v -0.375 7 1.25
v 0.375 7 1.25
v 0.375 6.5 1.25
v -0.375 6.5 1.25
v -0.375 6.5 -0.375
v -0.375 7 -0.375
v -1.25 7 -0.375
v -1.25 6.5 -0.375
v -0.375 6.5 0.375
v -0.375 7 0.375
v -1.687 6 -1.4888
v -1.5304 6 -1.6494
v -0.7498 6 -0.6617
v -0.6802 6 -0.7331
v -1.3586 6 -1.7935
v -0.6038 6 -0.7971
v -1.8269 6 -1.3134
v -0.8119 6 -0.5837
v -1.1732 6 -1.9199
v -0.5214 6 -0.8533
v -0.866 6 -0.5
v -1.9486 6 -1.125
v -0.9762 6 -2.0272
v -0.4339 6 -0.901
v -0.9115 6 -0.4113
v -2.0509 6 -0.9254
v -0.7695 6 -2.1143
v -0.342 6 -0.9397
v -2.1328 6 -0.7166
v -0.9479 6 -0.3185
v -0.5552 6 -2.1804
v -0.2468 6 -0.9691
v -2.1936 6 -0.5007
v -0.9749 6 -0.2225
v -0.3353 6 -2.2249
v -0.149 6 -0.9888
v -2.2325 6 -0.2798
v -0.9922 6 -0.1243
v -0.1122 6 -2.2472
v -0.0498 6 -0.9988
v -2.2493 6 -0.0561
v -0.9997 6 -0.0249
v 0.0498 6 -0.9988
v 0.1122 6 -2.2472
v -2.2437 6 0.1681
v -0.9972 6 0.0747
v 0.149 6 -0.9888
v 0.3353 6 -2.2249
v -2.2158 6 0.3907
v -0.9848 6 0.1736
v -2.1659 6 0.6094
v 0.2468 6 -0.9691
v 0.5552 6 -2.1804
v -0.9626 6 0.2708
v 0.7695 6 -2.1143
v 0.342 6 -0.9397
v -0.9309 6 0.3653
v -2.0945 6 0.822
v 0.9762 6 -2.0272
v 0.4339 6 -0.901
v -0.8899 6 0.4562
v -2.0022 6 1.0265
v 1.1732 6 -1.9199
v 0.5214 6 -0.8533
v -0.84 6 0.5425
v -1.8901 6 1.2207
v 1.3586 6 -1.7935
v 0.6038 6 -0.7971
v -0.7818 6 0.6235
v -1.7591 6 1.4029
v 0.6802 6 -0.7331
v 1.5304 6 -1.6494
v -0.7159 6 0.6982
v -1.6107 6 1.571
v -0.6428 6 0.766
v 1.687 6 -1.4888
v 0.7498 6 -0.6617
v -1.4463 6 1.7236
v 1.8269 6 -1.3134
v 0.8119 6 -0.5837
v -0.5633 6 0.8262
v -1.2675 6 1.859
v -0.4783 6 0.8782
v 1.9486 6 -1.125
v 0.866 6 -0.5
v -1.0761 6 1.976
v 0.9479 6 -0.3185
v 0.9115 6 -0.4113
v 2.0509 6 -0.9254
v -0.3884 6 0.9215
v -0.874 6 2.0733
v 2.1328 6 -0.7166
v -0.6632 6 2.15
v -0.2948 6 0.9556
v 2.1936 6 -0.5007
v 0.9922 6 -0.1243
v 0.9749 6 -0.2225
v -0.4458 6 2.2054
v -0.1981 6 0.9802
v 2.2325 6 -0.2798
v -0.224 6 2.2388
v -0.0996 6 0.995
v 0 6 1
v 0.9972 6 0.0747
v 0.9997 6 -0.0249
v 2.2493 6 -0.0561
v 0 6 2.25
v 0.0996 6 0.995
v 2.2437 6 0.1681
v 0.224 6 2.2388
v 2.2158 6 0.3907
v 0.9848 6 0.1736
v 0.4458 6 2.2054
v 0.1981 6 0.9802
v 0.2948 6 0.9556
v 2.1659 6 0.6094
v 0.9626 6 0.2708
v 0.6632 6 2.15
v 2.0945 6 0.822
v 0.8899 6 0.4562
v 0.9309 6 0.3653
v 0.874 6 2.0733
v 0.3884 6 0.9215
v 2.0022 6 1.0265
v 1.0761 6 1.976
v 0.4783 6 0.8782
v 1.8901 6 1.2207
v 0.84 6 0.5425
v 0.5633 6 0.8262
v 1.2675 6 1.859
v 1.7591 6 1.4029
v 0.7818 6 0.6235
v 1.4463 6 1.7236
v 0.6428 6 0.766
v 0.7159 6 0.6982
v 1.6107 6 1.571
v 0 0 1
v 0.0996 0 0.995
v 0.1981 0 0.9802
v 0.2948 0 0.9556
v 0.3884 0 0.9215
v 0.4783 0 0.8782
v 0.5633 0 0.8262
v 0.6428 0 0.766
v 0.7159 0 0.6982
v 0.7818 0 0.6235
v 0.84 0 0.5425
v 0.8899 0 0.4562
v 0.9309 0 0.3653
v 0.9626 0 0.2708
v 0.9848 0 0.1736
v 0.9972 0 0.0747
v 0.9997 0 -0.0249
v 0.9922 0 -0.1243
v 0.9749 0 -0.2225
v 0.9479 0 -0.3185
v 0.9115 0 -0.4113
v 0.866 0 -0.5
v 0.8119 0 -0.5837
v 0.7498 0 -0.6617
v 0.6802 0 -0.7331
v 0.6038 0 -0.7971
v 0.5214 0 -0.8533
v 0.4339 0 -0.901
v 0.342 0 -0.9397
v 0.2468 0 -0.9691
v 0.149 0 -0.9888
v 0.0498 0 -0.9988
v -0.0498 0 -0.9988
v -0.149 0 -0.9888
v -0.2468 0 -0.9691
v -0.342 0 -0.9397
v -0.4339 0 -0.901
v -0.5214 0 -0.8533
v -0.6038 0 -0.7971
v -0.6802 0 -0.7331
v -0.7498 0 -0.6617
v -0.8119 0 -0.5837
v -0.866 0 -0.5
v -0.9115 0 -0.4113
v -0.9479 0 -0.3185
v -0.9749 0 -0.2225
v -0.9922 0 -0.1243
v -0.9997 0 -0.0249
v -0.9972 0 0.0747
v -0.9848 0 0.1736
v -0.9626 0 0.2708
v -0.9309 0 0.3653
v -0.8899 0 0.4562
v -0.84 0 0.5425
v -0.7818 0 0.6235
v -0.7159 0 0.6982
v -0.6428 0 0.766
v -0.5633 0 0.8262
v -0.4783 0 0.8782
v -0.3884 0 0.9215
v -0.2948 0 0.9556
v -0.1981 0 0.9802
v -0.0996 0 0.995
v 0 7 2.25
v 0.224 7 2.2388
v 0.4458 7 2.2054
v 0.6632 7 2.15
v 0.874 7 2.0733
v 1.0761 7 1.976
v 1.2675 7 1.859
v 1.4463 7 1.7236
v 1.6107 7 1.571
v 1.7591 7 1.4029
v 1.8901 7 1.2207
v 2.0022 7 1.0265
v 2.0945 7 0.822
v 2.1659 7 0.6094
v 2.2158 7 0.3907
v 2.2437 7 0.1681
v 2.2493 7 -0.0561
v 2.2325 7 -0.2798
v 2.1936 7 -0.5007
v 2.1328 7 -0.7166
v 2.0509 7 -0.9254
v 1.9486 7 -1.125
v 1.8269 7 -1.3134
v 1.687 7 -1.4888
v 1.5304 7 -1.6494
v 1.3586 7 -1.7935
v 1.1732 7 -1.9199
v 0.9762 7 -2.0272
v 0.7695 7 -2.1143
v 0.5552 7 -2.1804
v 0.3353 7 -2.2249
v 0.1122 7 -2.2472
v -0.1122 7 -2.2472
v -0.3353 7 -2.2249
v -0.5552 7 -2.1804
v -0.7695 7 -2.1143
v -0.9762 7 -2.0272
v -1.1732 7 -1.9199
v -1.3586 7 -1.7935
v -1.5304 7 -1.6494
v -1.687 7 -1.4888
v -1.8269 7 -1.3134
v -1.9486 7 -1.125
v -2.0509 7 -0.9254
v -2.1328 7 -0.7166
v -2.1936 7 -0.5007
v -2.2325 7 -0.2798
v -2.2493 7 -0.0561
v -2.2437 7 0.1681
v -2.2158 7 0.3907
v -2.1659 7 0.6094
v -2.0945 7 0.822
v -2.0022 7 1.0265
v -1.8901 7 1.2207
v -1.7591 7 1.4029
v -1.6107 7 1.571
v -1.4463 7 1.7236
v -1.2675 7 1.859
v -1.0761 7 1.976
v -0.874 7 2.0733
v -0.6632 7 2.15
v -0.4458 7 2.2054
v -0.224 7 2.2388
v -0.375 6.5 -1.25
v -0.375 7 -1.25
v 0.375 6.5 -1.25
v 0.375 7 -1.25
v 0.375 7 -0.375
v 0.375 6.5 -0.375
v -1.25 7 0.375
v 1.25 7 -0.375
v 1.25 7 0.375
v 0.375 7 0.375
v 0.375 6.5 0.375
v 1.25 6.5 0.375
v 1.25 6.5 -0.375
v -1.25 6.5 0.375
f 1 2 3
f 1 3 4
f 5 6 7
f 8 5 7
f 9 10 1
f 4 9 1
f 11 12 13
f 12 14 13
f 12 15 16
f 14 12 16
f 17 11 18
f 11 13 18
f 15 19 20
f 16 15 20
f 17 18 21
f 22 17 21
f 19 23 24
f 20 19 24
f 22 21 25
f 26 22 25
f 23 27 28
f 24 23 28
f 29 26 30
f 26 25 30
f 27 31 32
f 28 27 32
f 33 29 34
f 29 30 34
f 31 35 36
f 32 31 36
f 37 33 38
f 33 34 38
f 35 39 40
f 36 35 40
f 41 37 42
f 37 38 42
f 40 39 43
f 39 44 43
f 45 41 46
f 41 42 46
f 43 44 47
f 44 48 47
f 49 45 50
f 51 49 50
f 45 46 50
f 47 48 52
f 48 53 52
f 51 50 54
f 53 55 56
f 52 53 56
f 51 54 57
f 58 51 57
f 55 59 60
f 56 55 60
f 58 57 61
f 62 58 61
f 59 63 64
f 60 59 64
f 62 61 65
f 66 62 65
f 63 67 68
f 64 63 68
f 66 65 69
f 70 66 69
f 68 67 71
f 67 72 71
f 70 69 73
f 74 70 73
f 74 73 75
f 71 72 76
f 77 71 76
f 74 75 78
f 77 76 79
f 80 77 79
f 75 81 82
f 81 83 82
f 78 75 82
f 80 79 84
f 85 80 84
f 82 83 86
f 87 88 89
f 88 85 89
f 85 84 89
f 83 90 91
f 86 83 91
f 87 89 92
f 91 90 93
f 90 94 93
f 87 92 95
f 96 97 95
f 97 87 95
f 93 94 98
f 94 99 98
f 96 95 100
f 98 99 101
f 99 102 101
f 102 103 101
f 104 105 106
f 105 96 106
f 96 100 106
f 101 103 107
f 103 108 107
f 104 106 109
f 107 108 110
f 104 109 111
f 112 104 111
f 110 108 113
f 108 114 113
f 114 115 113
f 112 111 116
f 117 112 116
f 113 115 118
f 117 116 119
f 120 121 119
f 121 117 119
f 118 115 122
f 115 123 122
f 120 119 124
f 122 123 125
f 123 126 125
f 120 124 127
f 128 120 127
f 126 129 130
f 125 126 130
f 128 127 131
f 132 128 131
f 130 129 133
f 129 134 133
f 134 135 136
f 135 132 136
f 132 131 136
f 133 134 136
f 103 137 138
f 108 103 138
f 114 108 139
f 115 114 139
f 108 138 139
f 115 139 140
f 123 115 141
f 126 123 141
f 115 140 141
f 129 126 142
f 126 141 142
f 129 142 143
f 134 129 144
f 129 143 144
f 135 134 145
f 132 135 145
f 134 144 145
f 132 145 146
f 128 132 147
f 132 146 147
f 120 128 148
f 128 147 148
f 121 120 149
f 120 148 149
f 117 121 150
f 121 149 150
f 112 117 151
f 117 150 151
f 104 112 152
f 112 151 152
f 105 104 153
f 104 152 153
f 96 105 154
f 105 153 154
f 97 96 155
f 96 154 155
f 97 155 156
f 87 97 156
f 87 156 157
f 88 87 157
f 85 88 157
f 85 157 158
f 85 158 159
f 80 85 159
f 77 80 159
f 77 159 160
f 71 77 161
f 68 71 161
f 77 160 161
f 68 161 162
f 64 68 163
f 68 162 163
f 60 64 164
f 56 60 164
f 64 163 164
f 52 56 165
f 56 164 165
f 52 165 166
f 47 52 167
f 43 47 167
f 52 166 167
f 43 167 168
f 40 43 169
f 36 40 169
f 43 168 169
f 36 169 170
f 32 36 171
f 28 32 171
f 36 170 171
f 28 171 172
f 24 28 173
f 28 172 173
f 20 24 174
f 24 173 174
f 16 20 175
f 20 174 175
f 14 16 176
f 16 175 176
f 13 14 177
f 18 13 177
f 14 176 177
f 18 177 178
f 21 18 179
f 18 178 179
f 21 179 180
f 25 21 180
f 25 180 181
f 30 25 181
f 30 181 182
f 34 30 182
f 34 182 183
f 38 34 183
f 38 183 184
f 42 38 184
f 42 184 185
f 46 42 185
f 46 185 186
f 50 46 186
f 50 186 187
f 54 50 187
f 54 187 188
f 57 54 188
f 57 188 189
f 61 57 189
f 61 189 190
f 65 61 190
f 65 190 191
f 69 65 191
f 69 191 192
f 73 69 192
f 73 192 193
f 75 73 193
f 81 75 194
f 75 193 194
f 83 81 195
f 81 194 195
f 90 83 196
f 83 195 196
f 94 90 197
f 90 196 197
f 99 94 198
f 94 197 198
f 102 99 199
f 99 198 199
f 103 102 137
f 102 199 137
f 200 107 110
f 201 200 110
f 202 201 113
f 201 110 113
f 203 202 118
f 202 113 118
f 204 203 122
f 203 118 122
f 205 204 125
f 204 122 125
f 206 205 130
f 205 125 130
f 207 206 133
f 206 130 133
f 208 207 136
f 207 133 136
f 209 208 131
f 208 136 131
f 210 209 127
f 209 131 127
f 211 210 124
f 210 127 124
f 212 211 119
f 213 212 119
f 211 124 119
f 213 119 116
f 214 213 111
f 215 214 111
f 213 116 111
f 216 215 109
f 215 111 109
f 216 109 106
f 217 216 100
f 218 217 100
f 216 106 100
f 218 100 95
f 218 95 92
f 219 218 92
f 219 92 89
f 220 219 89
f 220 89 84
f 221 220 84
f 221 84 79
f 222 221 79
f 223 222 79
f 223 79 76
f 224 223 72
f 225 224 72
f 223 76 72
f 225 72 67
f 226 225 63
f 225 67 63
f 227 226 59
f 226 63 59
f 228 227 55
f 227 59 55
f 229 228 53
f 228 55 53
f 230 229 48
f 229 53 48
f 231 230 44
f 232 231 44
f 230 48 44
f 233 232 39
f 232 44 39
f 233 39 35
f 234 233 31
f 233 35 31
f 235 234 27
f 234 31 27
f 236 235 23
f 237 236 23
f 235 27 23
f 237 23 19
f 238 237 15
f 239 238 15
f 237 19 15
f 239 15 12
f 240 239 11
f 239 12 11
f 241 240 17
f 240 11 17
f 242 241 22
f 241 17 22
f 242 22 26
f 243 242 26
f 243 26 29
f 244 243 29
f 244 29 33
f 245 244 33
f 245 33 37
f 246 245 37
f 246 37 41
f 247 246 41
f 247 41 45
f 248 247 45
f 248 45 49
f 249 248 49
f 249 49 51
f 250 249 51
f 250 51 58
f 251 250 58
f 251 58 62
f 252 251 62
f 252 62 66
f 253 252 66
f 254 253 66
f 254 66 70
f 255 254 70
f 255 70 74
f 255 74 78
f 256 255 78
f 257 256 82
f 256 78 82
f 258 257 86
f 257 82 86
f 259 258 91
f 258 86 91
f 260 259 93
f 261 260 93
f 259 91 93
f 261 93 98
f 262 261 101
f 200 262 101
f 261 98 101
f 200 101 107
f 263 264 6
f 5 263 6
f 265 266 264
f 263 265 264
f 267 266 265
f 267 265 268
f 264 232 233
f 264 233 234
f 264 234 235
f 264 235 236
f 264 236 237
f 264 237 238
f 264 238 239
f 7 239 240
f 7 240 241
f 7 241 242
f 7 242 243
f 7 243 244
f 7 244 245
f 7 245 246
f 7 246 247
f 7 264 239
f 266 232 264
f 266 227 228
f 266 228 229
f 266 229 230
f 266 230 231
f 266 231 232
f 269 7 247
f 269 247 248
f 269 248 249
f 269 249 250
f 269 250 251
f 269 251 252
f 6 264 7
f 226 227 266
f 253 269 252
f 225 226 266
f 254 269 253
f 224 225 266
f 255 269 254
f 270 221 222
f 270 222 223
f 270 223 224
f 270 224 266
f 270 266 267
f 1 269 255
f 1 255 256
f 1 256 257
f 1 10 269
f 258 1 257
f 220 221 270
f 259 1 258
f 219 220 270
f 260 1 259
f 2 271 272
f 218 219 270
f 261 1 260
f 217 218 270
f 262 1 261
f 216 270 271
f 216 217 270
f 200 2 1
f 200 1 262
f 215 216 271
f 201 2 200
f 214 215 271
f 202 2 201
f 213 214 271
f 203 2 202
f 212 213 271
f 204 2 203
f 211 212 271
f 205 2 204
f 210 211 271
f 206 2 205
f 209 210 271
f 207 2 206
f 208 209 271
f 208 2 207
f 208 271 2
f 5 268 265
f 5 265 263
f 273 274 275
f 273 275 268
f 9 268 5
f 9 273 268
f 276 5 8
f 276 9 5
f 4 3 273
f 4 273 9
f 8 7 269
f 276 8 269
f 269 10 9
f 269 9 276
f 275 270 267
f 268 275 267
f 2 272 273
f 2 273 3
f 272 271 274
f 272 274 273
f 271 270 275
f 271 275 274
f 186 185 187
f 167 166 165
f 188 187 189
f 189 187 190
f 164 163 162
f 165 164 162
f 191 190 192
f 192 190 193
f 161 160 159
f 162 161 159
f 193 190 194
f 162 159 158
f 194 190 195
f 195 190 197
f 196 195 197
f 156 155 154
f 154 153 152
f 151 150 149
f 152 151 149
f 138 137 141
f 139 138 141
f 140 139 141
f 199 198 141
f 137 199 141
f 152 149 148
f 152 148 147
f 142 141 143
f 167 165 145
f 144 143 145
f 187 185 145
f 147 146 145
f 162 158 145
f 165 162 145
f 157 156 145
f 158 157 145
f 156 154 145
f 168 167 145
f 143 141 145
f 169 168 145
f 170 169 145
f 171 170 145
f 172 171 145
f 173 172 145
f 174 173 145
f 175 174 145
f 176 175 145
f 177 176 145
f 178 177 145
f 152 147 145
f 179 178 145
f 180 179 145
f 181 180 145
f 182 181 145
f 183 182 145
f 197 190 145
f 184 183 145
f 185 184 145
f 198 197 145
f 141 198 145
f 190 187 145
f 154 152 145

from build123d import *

# Parameters (mm, degrees)
SKETCH_1_R          = 1
EXTRUDE_1_DEPTH     = 6
SKETCH_2_R          = 2.25
EXTRUDE_2_DEPTH     = 1
SKETCH_3_W          = 2.5
SKETCH_3_H          = 0.75
CUT_EXTRUDE_1_DEPTH = 0.5
SKETCH_4_W          = 0.75
SKETCH_4_H          = 2.5
CUT_EXTRUDE_2_DEPTH = 0.5


with BuildPart() as part:
    # 草图1 → 拉伸1 (new body)
    with BuildSketch(Plane(origin=(0, 0, 0), x_dir=(1, 0, 0), z_dir=(0, 1, 0))):
        with Locations(Location((0, 0, 0), (0, 0, 270))):
            Circle(SKETCH_1_R)
    extrude(amount=EXTRUDE_1_DEPTH)

    # 草图2 → 拉伸2 (add)
    with BuildSketch(Plane(origin=(0, 6, 0), x_dir=(-1, 0, 0), z_dir=(0, 1, 0))):
        with Locations(Location((0, 0, 0), (0, 0, 90))):
            Circle(SKETCH_2_R)
    extrude(amount=EXTRUDE_2_DEPTH)

    # 草图3 → 切除-拉伸1 (cut)
    with BuildSketch(Plane(origin=(0, 7, 0), x_dir=(-1, 0, 0), z_dir=(0, 1, 0))):
        Rectangle(SKETCH_3_W, SKETCH_3_H)
    extrude(amount=-CUT_EXTRUDE_1_DEPTH, mode=Mode.SUBTRACT)

    # 草图4 → 切除-拉伸2 (cut)
    with BuildSketch(Plane(origin=(0, 7, 0), x_dir=(-1, 0, 0), z_dir=(0, 1, 0))):
        Rectangle(SKETCH_4_W, SKETCH_4_H)
    extrude(amount=-CUT_EXTRUDE_2_DEPTH, mode=Mode.SUBTRACT)


solid = part.part
